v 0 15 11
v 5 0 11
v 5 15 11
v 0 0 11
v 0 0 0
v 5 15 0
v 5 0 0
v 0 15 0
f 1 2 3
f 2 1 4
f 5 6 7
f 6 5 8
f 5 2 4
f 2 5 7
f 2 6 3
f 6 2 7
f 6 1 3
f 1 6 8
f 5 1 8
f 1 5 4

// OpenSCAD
// Generated by SolidPython 1.0.1 on 2020-07-29 00:46:54


cube(size = [5, 15, 11]);
/***********************************************
*********      SolidPython code:      **********
************************************************
 
# import packages: SolidPython
from solid import *
from solid.utils import *
from itertools import chain, combinations, permutations


class Resize:

    def __init__(self, scad_file):
        self.scad_file = scad_file
        #self.scad_file = import_scad(scad_file)
        # cone/cylinder param:
        self.r1 = 0
        self.r2 = 0
        self.h = 0
        # rectangular prism param:
        self.w = 0
        self.l = 0
        # ellipse param:
        self.r = 0

    # import OpenScad code (file name corresponds to shape)


    # classify shape + parameters
    def assign(self, param1, param2, param3):
        if self.scad_file == 'cone.scad':
            self.r1 = param1
            self.r2 = param2
            self.h = param3
        elif self.scad_file == 'cylinder.scad':
            self.r1 = param1
            self.r2 = param2
            self.h = param3
        elif self.scad_file == 'rectangularPrism.scad':
            self.h = param1
            self.l = param2
            self.w = param3
        else:
            self.r = param1
            self.h = param2

    # resize parameters
    def iterate(self):
        x = range(3, 20, 2)
        i = 1
        if self.scad_file == 'cone.scad':
            tempList = list(permutations(x, 2))
            for temp in tempList:
                param1 = temp[0]
                param2 = temp[1]
                filepath = 'produced_scad_files/' + 'cone' + str(param1) + '_' + str(param2) + '_' + '.scad'
                scad_render_to_file(cylinder(h=param1, r1=param2, r2=0), filepath)

        elif self.scad_file == 'cylinder.scad':
            tempList = list(permutations(x, 3))
            for temp in tempList:
                param1 = temp[0]
                param2 = temp[1]
                filepath = 'produced_scad_files/' + 'cylinder' + str(param1) + '_' + str(param2) + '_' + '.scad'
                scad_render_to_file(cylinder(h=param1, r1=param2, r2=param2), filepath)

        elif self.scad_file == 'rectangularPrism.scad':
            tempList = list(permutations(x, 3))
            for temp in tempList:
                param1 = temp[0]
                param2 = temp[1]
                param3 = temp[2]
                filepath = 'produced_scad_files/' + 'rectangularPrism' + str(param1) + '_' + str(param2) + '_' + str(
                    param3) + '.scad'
                scad_render_to_file(cube(size=(param1, param2, param3)), filepath)

        elif self.scad_file == 'ellipse.scad':
            tempList = list(permutations(x, 4))
            for temp in tempList:
                param1 = temp[0]
                param2 = temp[1]
                param3 = temp[2]
                param4 = temp[3]
                filepath = 'produced_scad_files/' + 'ellipse' + str(param1) + '_' + str(param2) + '_' + str(param3) + '_' + str(param4) + '.scad'
                scad_render_to_file(scale([param1, param2, param3])(sphere(r=param4)), filepath)

    def render_to_scadfile(self):
        scad_render_to_file(scad, 'example.scad') 
 
************************************************/
